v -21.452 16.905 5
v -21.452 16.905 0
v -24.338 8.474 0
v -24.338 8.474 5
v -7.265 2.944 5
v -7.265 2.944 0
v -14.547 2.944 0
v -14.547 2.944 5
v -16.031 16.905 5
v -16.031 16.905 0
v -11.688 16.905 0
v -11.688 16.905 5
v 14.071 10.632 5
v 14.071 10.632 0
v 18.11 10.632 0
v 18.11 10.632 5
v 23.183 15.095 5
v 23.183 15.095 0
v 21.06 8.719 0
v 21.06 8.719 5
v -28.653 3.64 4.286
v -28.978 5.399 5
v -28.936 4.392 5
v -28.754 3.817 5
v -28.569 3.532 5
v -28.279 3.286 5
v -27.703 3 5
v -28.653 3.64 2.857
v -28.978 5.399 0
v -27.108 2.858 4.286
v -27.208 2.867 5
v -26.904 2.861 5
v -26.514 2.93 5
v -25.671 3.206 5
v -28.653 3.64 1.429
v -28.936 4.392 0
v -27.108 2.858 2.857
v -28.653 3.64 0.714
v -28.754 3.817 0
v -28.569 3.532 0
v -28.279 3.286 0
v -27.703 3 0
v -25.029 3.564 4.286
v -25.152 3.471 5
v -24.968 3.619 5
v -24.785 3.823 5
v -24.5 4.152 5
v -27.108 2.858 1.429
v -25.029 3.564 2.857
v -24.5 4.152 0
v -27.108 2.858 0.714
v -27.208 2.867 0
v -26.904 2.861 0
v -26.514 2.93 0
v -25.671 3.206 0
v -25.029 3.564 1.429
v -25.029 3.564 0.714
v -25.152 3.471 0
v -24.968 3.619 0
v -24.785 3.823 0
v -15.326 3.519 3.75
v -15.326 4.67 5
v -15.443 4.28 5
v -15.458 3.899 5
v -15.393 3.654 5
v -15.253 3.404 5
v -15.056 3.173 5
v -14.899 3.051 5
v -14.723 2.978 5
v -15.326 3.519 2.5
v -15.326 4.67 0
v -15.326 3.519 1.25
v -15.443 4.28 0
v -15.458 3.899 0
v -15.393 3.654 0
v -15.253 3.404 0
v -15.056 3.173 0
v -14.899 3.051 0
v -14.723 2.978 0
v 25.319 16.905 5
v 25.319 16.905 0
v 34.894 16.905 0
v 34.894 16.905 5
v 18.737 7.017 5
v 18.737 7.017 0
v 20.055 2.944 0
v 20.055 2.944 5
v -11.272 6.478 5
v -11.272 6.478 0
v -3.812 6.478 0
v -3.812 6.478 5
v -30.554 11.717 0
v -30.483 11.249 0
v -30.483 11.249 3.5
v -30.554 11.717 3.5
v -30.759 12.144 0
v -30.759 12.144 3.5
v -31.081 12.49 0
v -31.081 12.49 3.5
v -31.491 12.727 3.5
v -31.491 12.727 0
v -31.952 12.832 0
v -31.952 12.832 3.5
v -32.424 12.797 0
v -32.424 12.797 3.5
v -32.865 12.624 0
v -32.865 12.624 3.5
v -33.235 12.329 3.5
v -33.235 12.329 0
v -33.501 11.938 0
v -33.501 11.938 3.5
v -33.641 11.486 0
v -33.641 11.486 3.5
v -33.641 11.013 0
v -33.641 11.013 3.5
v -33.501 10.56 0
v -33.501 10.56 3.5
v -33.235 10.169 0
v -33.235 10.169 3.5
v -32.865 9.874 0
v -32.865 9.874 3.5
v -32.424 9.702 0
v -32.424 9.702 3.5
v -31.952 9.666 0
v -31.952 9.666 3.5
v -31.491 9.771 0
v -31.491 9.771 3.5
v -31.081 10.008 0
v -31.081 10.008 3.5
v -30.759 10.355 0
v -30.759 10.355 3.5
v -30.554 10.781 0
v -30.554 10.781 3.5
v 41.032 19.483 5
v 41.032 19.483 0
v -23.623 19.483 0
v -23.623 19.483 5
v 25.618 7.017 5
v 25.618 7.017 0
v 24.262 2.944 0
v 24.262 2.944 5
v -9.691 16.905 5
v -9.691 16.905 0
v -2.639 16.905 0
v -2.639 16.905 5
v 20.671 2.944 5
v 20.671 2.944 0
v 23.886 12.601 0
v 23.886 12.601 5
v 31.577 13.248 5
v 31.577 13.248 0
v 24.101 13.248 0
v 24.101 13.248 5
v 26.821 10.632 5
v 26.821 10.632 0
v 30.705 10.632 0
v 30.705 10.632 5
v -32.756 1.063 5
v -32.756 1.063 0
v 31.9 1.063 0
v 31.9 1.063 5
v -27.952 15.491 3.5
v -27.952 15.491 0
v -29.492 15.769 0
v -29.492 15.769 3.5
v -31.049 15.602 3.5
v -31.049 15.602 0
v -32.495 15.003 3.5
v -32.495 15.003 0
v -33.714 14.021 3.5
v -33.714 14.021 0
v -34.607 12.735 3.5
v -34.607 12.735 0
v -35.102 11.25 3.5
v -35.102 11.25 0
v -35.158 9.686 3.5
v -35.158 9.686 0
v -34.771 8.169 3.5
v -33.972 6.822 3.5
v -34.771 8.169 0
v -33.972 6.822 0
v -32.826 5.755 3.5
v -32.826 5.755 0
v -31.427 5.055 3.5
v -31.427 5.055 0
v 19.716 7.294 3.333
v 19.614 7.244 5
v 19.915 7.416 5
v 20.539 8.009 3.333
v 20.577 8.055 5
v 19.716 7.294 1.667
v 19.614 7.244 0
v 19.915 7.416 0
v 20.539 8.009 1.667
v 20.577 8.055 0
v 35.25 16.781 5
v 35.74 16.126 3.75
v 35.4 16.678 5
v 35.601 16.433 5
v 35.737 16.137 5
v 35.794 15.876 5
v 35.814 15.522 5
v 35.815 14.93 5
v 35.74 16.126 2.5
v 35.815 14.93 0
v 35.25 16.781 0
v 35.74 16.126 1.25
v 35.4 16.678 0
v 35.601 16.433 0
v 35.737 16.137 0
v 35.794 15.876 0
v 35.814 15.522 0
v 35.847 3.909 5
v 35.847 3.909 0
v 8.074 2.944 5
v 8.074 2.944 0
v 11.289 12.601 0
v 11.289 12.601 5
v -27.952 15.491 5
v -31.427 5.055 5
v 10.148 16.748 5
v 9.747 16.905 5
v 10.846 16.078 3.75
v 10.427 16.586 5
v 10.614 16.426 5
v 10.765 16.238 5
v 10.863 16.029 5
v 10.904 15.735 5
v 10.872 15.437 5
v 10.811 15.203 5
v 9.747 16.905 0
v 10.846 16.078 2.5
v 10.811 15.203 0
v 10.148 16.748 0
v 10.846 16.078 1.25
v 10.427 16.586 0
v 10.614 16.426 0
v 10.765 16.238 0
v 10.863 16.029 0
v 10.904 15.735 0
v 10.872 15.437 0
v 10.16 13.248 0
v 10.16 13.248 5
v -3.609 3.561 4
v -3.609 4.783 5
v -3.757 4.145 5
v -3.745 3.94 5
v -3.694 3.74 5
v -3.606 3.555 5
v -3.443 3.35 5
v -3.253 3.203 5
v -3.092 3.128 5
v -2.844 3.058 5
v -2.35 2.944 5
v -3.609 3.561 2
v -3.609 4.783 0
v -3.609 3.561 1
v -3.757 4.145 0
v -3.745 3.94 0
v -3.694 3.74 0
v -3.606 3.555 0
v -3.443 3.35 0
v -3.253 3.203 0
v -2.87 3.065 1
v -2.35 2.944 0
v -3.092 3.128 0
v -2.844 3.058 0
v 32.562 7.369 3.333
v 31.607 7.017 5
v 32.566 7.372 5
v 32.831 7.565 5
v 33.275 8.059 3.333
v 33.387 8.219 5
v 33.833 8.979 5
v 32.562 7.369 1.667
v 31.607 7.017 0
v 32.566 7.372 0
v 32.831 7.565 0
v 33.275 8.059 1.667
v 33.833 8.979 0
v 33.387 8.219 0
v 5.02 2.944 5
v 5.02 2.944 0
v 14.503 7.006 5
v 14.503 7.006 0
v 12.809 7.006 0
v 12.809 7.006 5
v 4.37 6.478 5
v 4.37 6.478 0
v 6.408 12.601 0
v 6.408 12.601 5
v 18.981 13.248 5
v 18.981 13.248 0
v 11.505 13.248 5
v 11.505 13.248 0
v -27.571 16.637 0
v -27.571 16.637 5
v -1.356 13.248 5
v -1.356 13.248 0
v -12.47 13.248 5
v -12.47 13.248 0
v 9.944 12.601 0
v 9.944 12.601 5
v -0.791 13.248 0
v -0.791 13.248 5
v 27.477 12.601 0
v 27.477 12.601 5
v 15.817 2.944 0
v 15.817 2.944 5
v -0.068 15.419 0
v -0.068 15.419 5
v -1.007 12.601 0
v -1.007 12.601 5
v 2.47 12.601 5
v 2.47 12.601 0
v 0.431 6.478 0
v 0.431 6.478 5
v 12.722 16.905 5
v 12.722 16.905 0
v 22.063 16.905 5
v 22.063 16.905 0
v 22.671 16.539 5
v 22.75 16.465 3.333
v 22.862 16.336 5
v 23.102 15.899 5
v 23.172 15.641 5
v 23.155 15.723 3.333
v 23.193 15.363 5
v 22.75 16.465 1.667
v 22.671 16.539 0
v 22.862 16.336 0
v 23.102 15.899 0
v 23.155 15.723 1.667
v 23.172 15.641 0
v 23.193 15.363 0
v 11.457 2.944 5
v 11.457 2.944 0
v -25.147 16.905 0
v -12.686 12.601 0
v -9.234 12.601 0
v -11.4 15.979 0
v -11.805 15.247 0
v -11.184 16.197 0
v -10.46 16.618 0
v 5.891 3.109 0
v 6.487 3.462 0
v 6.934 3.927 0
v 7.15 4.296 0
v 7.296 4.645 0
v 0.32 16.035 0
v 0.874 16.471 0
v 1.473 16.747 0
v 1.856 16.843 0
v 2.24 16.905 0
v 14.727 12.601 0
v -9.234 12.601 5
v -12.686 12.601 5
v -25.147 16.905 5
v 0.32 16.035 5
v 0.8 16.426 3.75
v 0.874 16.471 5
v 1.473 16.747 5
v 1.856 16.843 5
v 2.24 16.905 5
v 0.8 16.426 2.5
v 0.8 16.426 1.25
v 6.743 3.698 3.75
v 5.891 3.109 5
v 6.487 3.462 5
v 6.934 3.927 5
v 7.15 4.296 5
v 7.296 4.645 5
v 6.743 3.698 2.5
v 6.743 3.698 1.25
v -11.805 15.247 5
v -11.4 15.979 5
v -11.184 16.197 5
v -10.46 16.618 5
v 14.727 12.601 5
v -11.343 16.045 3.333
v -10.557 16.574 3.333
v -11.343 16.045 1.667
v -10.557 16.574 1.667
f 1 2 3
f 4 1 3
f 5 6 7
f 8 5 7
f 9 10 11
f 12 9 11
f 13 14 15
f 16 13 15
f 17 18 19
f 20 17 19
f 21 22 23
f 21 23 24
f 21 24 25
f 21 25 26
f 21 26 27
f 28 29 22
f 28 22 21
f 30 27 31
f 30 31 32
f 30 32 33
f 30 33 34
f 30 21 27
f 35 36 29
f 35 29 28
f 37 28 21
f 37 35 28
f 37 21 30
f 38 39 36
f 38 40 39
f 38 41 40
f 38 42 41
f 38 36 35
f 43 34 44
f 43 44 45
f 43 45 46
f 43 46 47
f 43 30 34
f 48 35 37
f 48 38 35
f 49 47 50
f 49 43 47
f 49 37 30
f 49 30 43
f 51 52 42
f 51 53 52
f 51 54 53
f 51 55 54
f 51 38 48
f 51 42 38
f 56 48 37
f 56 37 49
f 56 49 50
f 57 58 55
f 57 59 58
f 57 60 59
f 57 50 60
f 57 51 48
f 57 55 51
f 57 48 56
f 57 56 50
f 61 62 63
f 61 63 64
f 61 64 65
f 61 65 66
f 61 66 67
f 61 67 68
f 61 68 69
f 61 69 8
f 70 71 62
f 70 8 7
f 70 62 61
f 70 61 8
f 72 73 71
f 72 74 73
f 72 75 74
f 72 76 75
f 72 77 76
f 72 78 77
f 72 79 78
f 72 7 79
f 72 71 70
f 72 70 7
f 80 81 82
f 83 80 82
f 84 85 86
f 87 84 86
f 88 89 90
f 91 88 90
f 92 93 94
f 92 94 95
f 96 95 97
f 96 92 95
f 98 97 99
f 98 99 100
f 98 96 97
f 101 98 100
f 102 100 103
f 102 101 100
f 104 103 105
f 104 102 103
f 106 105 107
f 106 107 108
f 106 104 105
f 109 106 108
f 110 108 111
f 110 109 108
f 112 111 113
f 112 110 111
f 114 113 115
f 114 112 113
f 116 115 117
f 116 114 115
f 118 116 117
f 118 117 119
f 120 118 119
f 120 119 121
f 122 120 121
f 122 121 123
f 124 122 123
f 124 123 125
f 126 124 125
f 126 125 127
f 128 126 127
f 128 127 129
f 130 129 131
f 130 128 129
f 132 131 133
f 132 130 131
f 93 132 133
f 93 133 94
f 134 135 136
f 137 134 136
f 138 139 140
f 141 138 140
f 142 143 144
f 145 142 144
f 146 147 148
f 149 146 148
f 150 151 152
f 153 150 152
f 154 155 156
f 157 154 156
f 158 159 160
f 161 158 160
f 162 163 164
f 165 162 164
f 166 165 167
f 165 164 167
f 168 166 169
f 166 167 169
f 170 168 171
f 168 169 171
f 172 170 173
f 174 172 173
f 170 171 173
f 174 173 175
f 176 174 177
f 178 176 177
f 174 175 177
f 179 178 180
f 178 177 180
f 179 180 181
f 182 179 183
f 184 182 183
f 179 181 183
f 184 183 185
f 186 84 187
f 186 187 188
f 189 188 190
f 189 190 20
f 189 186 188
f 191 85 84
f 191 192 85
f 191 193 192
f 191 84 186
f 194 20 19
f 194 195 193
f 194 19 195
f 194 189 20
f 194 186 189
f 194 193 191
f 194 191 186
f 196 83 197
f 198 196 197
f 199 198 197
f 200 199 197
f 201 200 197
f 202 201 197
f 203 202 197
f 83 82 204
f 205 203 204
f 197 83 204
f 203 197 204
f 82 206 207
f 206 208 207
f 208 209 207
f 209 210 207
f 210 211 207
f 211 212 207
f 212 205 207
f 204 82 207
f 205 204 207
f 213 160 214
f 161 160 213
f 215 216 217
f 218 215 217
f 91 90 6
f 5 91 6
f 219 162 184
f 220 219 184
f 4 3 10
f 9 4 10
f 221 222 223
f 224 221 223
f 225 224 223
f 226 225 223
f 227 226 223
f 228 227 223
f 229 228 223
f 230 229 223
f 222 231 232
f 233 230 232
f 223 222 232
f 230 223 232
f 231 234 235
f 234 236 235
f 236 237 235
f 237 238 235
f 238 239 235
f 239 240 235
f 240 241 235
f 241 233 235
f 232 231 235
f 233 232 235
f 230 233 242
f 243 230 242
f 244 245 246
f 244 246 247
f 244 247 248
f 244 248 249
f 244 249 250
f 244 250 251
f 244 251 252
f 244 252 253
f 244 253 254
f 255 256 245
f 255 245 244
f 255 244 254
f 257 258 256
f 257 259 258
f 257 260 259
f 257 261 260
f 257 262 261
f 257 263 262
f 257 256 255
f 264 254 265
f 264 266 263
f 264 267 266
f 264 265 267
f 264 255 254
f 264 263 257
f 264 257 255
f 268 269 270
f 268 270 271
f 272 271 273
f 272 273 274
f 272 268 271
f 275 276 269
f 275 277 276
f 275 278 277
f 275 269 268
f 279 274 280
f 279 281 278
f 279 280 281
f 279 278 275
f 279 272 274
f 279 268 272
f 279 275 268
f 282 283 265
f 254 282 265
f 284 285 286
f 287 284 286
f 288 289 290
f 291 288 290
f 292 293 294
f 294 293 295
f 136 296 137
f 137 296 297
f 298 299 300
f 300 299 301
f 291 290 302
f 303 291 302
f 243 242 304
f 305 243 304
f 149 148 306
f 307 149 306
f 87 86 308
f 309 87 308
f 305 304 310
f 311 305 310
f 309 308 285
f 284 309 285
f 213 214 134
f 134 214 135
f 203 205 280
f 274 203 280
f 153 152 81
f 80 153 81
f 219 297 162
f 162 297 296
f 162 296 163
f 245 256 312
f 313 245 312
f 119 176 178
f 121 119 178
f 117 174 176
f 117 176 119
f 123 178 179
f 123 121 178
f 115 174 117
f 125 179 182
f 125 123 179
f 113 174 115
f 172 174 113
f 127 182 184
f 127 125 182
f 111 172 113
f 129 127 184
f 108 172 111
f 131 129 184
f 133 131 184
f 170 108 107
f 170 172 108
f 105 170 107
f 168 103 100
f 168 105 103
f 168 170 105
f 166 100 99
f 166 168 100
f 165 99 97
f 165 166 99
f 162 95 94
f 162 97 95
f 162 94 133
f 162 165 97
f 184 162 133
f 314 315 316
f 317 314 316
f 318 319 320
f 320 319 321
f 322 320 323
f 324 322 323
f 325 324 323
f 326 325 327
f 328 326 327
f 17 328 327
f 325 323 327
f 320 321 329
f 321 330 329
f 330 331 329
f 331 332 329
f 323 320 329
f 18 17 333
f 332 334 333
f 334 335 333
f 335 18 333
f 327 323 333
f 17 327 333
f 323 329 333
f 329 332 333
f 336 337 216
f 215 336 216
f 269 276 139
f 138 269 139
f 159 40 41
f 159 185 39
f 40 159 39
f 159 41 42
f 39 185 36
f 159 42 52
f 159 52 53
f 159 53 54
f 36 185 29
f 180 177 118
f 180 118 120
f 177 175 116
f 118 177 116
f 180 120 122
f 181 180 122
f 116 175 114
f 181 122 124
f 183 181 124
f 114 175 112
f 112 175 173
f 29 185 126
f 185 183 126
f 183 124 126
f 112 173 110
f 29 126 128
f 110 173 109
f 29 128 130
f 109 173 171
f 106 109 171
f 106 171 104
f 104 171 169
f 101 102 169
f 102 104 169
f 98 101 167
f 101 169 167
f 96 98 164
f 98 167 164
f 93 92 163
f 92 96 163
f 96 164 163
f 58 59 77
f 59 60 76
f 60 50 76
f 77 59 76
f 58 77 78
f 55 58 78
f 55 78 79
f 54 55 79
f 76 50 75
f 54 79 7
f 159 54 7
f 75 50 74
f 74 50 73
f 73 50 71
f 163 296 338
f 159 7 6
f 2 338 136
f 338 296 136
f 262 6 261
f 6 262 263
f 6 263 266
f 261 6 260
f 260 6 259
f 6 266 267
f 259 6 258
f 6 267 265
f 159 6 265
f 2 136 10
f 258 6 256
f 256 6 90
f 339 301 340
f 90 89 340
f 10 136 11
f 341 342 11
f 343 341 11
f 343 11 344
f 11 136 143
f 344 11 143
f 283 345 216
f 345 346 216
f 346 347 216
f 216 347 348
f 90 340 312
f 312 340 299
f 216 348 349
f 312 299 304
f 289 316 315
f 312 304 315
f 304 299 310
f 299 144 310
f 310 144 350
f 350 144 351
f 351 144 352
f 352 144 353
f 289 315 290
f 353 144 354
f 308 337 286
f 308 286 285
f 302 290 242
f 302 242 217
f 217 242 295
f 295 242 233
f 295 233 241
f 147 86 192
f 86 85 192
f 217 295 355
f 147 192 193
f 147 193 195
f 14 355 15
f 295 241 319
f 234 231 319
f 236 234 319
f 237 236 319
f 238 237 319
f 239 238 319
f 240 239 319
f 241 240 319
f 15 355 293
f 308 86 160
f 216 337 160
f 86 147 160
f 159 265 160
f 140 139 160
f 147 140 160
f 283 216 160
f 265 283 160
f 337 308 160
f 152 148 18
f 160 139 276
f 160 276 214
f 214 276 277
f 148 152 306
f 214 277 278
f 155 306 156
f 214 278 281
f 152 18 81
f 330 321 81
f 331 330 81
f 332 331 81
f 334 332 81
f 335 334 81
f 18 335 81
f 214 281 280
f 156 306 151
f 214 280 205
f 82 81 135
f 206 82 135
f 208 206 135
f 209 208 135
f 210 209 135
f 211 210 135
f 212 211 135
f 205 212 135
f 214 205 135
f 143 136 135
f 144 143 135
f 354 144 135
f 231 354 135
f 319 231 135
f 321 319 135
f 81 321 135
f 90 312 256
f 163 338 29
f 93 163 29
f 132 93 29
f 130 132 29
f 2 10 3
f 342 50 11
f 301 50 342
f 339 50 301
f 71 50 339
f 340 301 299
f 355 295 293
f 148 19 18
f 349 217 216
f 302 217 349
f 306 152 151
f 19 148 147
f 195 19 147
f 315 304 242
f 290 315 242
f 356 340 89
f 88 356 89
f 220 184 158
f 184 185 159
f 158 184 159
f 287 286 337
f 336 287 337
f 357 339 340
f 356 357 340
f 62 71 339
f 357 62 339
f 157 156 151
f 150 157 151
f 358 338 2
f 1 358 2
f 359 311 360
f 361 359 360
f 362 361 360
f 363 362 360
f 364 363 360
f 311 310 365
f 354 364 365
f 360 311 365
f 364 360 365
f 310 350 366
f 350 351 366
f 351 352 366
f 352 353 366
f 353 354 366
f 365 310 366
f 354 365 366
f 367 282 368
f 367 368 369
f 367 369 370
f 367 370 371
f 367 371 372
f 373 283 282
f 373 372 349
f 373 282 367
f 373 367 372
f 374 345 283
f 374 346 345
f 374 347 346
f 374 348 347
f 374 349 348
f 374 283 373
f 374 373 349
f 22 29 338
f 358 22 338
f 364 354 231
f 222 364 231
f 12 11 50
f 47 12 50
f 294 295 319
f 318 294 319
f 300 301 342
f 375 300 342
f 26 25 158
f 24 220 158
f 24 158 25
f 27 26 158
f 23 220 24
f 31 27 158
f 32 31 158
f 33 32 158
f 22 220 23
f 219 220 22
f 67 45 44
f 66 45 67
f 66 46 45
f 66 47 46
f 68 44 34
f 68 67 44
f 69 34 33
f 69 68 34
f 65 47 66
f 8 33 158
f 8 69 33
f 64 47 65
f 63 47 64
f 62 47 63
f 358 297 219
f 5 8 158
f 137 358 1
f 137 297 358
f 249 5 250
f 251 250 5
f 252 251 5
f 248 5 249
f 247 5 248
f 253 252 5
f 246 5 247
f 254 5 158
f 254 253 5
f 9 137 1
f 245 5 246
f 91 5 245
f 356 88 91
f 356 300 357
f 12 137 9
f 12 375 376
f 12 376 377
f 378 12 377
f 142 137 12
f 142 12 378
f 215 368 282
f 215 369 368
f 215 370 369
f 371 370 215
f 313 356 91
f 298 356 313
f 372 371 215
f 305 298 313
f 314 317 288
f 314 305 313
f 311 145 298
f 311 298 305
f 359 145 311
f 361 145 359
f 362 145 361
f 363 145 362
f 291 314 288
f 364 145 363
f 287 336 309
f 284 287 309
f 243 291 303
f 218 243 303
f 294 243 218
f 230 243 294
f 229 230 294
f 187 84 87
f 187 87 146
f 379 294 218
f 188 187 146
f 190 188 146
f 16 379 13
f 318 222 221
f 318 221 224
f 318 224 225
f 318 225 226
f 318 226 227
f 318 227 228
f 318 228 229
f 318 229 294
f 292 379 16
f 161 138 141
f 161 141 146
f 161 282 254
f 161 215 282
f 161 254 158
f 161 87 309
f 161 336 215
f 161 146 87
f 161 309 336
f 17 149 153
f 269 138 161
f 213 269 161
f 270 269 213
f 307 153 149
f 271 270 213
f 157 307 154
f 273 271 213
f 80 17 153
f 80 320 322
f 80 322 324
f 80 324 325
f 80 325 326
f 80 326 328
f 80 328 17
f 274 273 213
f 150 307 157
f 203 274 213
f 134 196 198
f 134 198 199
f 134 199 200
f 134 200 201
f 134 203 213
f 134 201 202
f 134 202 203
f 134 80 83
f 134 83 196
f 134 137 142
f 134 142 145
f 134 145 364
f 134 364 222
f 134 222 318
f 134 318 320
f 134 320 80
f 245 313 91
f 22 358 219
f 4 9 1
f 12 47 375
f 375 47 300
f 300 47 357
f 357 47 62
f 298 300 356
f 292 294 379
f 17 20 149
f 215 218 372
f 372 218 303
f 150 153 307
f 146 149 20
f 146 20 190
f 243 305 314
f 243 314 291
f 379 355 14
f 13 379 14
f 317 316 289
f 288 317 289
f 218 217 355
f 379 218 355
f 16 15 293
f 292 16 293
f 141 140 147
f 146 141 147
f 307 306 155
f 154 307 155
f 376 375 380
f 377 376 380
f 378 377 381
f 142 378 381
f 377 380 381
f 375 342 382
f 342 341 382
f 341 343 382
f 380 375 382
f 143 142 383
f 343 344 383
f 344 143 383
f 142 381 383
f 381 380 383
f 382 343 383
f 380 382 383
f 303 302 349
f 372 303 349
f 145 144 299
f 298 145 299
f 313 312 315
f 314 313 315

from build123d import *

# Parameters (mm, degrees)
F0_R     = 1.5875
F1_DEPTH = 3.5
F2_DEPTH = 5
F3_SIZE  = 3


with BuildPart() as f1:
    # F0 (on Top) → F1 (new body)
    with BuildSketch(Plane.XY):
        with BuildLine():
            Line((-31.4265900099, 5.0546218881), (-27.9518529079, 15.4913935188))
            ThreePointArc((-27.9518529079, 15.4913935188), (-34.9076072742, 12.0103762544), (-31.4265900099, 5.0546218881))
        make_face()
        with Locations((-32.070890069, 11.2492460757)):
            Circle(F0_R, mode=Mode.SUBTRACT)
    extrude(amount=F1_DEPTH)

    # F0 (on Top) → F2 (join)
    with BuildSketch(Plane.XY):
        Polygon((41.0324722573, 19.4832161069), (-26.6228467226, 19.4832161069), (-27.9518529079, 15.4913935188), (-31.4265900099, 5.0546218881), (-32.7555961951, 1.0627993), (34.8997227848, 1.0627993), align=None)
        with BuildLine():
            Line((-28.9777275175, 5.3988145664), (-25.1468084753, 16.9054195285))
            Line((-25.1468084753, 16.9054195285), (-21.4522741735, 16.9054195285))
            Line((-21.4522741735, 16.9054195285), (-24.3383795023, 8.4737306461))
            Line((-24.3383795023, 8.4737306461), (-16.0307120532, 16.9054195285))
            Line((-16.0307120532, 16.9054195285), (-11.6880685091, 16.9054195285))
            Line((-11.6880685091, 16.9054195285), (-24.5002172887, 4.1521633975))
            add(Edge.make_bspline(
                [(-28.9777275175, 5.3988145664), (-28.9920829502, 5.1753823662), (-29.0245338372, 4.6708365307), (-28.75422588, 3.5537688412), (-27.9998356891, 3.1048311498), (-27.0958013154, 2.7514319548), (-26.1181460942, 3.0356500809), (-24.9673965188, 3.4478523222), (-24.6669790891, 4.0076975842), (-24.5002172887, 4.1521633975)],
                knots=[0, 0, 0, 0, 0.1262969211, 0.2800240671, 0.4158511978, 0.5575129061, 0.7061749681, 0.8684200327, 1, 1, 1, 1], degree=3))
        make_face(mode=Mode.SUBTRACT)
        with BuildLine():
            Line((-15.3263181921, 4.6695175429), (-12.6858081932, 12.6005923375))
            Line((-12.6858081932, 12.6005923375), (-9.2335287482, 12.6005923375))
            Line((-9.2335287482, 12.6005923375), (-11.2720251255, 6.4777345397))
            Line((-11.2720251255, 6.4777345397), (-3.8119675592, 6.4777345397))
            Line((-3.8119675592, 6.4777345397), (-7.2645042092, 2.9442787636))
            Line((-7.2645042092, 2.9442787636), (-14.5471990108, 2.9442787636))
            add(Edge.make_bspline(
                [(-15.3263181921, 4.6695175429), (-15.412953449, 4.4685670415), (-15.5153766012, 4.0139535839), (-15.3713346976, 3.5123078219), (-14.9348493955, 3.0029722267), (-14.6664225121, 2.9634887966), (-14.5471990108, 2.9442787636)],
                knots=[0, 0, 0, 0, 0.2769740748, 0.5225718313, 0.7922113558, 1, 1, 1, 1], degree=3))
        make_face(mode=Mode.SUBTRACT)
        with BuildLine():
            Line((-3.6092272494, 4.7830686145), (-1.006522056, 12.6005923375))
            Line((-1.006522056, 12.6005923375), (2.4699948262, 12.6005923375))
            Line((2.4699948262, 12.6005923375), (0.4314984489, 6.4777345397))
            Line((0.4314984489, 6.4777345397), (4.3695482254, 6.4777345397))
            Line((4.3695482254, 6.4777345397), (6.4080446027, 12.6005923375))
            Line((6.4080446027, 12.6005923375), (9.944493111, 12.6005923375))
            Line((9.944493111, 12.6005923375), (7.295898505, 4.6452344979))
            add(Edge.make_bspline(
                [(5.019672215, 2.9442787636), (5.3202927104, 2.9720111906), (5.9371146467, 3.0289133965), (6.7725368253, 3.6540595509), (7.1265212599, 4.2095994242), (7.2429882815, 4.5091504028), (7.295898505, 4.6452344979)],
                knots=[0, 0, 0, 0, 0.2778020394, 0.5700023599, 0.8046548203, 1, 1, 1, 1], degree=3))
            Line((5.019672215, 2.9442787636), (-2.3504255805, 2.9442787636))
            add(Edge.make_bspline(
                [(-3.6092272494, 4.7830686145), (-3.67113197, 4.5634032575), (-3.8212267897, 4.1675860799), (-3.6641600553, 3.5384581919), (-3.2517359041, 3.1591508461), (-2.8747256329, 3.0686619256), (-2.516107329, 2.9705723243), (-2.3504255805, 2.9442787636)],
                knots=[0, 0, 0, 0, 0.2197721338, 0.4329089146, 0.6302776263, 0.8005723672, 1, 1, 1, 1], degree=3))
        make_face(mode=Mode.SUBTRACT)
        with BuildLine():
            Line((14.7266461202, 12.6005923375), (14.0710948035, 10.6315687299))
            Line((14.0710948035, 10.6315687299), (18.1098322433, 10.6315687299))
            Line((18.1098322433, 10.6315687299), (18.9809072763, 13.247942552))
            Line((18.9809072763, 13.247942552), (11.5047557417, 13.247942552))
            Line((11.5047557417, 13.247942552), (12.7224475145, 16.9054195285))
            Line((12.7224475145, 16.9054195285), (22.0626555383, 16.9054195285))
            add(Edge.make_bspline(
                [(22.0626555383, 16.9054195285), (22.3089069671, 16.7843506596), (22.805584496, 16.5401604557), (23.2208609454, 15.7363707454), (23.1947312081, 15.2980748511), (23.1826324016, 15.0951314718)],
                knots=[0, 0, 0, 0, 0.3455584276, 0.6969750663, 1, 1, 1, 1], degree=3))
            Line((23.1826324016, 15.0951314718), (21.0596756466, 8.7185872374))
            add(Edge.make_bspline(
                [(18.7374129891, 7.0171933621), (19.0743271, 7.0747176968), (19.7600226879, 7.191792587), (20.5652309975, 7.9899188639), (20.9008130115, 8.4844696711), (21.0596756466, 8.7185872374)],
                knots=[0, 0, 0, 0, 0.3371723256, 0.6862211127, 1, 1, 1, 1], degree=3))
            Line((18.7374129891, 7.0171933621), (20.0548148302, 2.9442787636))
            Line((20.0548148302, 2.9442787636), (15.8165477837, 2.9442787636))
            Line((15.8165477837, 2.9442787636), (14.5026613027, 7.0063251812))
            Line((14.5026613027, 7.0063251812), (12.8089402386, 7.0063251812))
            Line((12.8089402386, 7.0063251812), (11.4565542809, 2.9442787636))
            Line((11.4565542809, 2.9442787636), (8.0743345234, 2.9442787636))
            Line((8.0743345234, 2.9442787636), (11.2892320254, 12.6005923375))
            Line((11.2892320254, 12.6005923375), (14.7266461202, 12.6005923375))
        make_face(mode=Mode.SUBTRACT)
        with BuildLine():
            Line((24.1011208061, 13.247942552), (25.3188125789, 16.9054195285))
            Line((25.3188125789, 16.9054195285), (34.8942168057, 16.9054195285))
            add(Edge.make_bspline(
                [(34.8942168057, 16.9054195285), (35.0684423878, 16.859968893), (35.4295860068, 16.7569322968), (35.7995742049, 16.1220536503), (35.8151353066, 15.5397566812), (35.8225300681, 15.0414425386), (35.8146689832, 14.9303343571)],
                knots=[0, 0, 0, 0, 0.2357708493, 0.4999954373, 0.7565613025, 1, 1, 1, 1], degree=3))
            Line((35.8146689832, 14.9303343571), (33.8334400243, 8.9794858223))
            add(Edge.make_bspline(
                [(31.6074602306, 7.0171933621), (31.942303977, 7.1079293231), (32.6079055145, 7.2882940327), (33.3166309684, 8.0405557477), (33.6588514346, 8.6622961839), (33.8334400243, 8.9794858223)],
                knots=[0, 0, 0, 0, 0.3315003144, 0.658955472, 1, 1, 1, 1], degree=3))
            Line((31.6074602306, 7.0171933621), (25.618012828, 7.0171933621))
            Line((25.618012828, 7.0171933621), (24.2620085031, 2.9442787636))
            Line((24.2620085031, 2.9442787636), (20.6706995878, 2.9442787636))
            Line((20.6706995878, 2.9442787636), (23.8855970898, 12.6005923375))
            Line((23.8855970898, 12.6005923375), (27.4769060051, 12.6005923375))
            Line((27.4769060051, 12.6005923375), (26.8213546884, 10.6315687299))
            Line((26.8213546884, 10.6315687299), (30.7054615629, 10.6315687299))
            Line((30.7054615629, 10.6315687299), (31.5765365958, 13.247942552))
            Line((31.5765365958, 13.247942552), (24.1011208061, 13.247942552))
        make_face(mode=Mode.SUBTRACT)
        with BuildLine():
            Line((-1.3555428013, 13.247942552), (-12.4702844769, 13.247942552))
            Line((-12.4702844769, 13.247942552), (-11.8047845561, 15.2468479336))
            add(Edge.make_bspline(
                [(-11.8047845561, 15.2468479336), (-11.6767305289, 15.5330426408), (-11.4188633608, 16.1093635911), (-10.5631227863, 16.6057970327), (-9.9809284289, 16.8059060028), (-9.6914051101, 16.9054195285)],
                knots=[0, 0, 0, 0, 0.3315021528, 0.6675582426, 1, 1, 1, 1], degree=3))
            Line((-9.6914051101, 16.9054195285), (-2.6385991368, 16.9054195285))
            Line((-2.6385991368, 16.9054195285), (-1.3555428013, 13.247942552))
        make_face(mode=Mode.SUBTRACT)
        with BuildLine():
            Line((10.8109767279, 15.2031753147), (10.1600168273, 13.247942552))
            Line((10.1600168273, 13.247942552), (-0.7909983397, 13.247942552))
            Line((-0.7909983397, 13.247942552), (-0.0682607797, 15.4187677514))
            add(Edge.make_bspline(
                [(-0.0682607797, 15.4187677514), (0.026154863, 15.6063153162), (0.2211252684, 15.9936052156), (0.7879268458, 16.4535320876), (1.5037634571, 16.7975556024), (1.9972902544, 16.8698487126), (2.2401232272, 16.9054195285)],
                knots=[0, 0, 0, 0, 0.2344122175, 0.484066451, 0.7461420976, 1, 1, 1, 1], degree=3))
            Line((2.2401232272, 16.9054195285), (9.7473124042, 16.9054195285))
            add(Edge.make_bspline(
                [(9.7473124042, 16.9054195285), (9.9647353691, 16.8279462307), (10.4021050332, 16.6721003647), (10.9269689865, 16.122615239), (10.9059285861, 15.5220470488), (10.8396165057, 15.2993547447), (10.8109767279, 15.2031753147)],
                knots=[0, 0, 0, 0, 0.2783973846, 0.5600262634, 0.8099780622, 1, 1, 1, 1], degree=3))
        make_face(mode=Mode.SUBTRACT)
    extrude(amount=F2_DEPTH)

    # F3
    f3_edges = [f1.edges().sort_by_distance(p)[0] for p in [
        (-26.622847, 19.483216, 2.5),
        (34.899723, 1.062799, 2.5),
    ]]
    chamfer(f3_edges, length=F3_SIZE)


solid = f1.part
